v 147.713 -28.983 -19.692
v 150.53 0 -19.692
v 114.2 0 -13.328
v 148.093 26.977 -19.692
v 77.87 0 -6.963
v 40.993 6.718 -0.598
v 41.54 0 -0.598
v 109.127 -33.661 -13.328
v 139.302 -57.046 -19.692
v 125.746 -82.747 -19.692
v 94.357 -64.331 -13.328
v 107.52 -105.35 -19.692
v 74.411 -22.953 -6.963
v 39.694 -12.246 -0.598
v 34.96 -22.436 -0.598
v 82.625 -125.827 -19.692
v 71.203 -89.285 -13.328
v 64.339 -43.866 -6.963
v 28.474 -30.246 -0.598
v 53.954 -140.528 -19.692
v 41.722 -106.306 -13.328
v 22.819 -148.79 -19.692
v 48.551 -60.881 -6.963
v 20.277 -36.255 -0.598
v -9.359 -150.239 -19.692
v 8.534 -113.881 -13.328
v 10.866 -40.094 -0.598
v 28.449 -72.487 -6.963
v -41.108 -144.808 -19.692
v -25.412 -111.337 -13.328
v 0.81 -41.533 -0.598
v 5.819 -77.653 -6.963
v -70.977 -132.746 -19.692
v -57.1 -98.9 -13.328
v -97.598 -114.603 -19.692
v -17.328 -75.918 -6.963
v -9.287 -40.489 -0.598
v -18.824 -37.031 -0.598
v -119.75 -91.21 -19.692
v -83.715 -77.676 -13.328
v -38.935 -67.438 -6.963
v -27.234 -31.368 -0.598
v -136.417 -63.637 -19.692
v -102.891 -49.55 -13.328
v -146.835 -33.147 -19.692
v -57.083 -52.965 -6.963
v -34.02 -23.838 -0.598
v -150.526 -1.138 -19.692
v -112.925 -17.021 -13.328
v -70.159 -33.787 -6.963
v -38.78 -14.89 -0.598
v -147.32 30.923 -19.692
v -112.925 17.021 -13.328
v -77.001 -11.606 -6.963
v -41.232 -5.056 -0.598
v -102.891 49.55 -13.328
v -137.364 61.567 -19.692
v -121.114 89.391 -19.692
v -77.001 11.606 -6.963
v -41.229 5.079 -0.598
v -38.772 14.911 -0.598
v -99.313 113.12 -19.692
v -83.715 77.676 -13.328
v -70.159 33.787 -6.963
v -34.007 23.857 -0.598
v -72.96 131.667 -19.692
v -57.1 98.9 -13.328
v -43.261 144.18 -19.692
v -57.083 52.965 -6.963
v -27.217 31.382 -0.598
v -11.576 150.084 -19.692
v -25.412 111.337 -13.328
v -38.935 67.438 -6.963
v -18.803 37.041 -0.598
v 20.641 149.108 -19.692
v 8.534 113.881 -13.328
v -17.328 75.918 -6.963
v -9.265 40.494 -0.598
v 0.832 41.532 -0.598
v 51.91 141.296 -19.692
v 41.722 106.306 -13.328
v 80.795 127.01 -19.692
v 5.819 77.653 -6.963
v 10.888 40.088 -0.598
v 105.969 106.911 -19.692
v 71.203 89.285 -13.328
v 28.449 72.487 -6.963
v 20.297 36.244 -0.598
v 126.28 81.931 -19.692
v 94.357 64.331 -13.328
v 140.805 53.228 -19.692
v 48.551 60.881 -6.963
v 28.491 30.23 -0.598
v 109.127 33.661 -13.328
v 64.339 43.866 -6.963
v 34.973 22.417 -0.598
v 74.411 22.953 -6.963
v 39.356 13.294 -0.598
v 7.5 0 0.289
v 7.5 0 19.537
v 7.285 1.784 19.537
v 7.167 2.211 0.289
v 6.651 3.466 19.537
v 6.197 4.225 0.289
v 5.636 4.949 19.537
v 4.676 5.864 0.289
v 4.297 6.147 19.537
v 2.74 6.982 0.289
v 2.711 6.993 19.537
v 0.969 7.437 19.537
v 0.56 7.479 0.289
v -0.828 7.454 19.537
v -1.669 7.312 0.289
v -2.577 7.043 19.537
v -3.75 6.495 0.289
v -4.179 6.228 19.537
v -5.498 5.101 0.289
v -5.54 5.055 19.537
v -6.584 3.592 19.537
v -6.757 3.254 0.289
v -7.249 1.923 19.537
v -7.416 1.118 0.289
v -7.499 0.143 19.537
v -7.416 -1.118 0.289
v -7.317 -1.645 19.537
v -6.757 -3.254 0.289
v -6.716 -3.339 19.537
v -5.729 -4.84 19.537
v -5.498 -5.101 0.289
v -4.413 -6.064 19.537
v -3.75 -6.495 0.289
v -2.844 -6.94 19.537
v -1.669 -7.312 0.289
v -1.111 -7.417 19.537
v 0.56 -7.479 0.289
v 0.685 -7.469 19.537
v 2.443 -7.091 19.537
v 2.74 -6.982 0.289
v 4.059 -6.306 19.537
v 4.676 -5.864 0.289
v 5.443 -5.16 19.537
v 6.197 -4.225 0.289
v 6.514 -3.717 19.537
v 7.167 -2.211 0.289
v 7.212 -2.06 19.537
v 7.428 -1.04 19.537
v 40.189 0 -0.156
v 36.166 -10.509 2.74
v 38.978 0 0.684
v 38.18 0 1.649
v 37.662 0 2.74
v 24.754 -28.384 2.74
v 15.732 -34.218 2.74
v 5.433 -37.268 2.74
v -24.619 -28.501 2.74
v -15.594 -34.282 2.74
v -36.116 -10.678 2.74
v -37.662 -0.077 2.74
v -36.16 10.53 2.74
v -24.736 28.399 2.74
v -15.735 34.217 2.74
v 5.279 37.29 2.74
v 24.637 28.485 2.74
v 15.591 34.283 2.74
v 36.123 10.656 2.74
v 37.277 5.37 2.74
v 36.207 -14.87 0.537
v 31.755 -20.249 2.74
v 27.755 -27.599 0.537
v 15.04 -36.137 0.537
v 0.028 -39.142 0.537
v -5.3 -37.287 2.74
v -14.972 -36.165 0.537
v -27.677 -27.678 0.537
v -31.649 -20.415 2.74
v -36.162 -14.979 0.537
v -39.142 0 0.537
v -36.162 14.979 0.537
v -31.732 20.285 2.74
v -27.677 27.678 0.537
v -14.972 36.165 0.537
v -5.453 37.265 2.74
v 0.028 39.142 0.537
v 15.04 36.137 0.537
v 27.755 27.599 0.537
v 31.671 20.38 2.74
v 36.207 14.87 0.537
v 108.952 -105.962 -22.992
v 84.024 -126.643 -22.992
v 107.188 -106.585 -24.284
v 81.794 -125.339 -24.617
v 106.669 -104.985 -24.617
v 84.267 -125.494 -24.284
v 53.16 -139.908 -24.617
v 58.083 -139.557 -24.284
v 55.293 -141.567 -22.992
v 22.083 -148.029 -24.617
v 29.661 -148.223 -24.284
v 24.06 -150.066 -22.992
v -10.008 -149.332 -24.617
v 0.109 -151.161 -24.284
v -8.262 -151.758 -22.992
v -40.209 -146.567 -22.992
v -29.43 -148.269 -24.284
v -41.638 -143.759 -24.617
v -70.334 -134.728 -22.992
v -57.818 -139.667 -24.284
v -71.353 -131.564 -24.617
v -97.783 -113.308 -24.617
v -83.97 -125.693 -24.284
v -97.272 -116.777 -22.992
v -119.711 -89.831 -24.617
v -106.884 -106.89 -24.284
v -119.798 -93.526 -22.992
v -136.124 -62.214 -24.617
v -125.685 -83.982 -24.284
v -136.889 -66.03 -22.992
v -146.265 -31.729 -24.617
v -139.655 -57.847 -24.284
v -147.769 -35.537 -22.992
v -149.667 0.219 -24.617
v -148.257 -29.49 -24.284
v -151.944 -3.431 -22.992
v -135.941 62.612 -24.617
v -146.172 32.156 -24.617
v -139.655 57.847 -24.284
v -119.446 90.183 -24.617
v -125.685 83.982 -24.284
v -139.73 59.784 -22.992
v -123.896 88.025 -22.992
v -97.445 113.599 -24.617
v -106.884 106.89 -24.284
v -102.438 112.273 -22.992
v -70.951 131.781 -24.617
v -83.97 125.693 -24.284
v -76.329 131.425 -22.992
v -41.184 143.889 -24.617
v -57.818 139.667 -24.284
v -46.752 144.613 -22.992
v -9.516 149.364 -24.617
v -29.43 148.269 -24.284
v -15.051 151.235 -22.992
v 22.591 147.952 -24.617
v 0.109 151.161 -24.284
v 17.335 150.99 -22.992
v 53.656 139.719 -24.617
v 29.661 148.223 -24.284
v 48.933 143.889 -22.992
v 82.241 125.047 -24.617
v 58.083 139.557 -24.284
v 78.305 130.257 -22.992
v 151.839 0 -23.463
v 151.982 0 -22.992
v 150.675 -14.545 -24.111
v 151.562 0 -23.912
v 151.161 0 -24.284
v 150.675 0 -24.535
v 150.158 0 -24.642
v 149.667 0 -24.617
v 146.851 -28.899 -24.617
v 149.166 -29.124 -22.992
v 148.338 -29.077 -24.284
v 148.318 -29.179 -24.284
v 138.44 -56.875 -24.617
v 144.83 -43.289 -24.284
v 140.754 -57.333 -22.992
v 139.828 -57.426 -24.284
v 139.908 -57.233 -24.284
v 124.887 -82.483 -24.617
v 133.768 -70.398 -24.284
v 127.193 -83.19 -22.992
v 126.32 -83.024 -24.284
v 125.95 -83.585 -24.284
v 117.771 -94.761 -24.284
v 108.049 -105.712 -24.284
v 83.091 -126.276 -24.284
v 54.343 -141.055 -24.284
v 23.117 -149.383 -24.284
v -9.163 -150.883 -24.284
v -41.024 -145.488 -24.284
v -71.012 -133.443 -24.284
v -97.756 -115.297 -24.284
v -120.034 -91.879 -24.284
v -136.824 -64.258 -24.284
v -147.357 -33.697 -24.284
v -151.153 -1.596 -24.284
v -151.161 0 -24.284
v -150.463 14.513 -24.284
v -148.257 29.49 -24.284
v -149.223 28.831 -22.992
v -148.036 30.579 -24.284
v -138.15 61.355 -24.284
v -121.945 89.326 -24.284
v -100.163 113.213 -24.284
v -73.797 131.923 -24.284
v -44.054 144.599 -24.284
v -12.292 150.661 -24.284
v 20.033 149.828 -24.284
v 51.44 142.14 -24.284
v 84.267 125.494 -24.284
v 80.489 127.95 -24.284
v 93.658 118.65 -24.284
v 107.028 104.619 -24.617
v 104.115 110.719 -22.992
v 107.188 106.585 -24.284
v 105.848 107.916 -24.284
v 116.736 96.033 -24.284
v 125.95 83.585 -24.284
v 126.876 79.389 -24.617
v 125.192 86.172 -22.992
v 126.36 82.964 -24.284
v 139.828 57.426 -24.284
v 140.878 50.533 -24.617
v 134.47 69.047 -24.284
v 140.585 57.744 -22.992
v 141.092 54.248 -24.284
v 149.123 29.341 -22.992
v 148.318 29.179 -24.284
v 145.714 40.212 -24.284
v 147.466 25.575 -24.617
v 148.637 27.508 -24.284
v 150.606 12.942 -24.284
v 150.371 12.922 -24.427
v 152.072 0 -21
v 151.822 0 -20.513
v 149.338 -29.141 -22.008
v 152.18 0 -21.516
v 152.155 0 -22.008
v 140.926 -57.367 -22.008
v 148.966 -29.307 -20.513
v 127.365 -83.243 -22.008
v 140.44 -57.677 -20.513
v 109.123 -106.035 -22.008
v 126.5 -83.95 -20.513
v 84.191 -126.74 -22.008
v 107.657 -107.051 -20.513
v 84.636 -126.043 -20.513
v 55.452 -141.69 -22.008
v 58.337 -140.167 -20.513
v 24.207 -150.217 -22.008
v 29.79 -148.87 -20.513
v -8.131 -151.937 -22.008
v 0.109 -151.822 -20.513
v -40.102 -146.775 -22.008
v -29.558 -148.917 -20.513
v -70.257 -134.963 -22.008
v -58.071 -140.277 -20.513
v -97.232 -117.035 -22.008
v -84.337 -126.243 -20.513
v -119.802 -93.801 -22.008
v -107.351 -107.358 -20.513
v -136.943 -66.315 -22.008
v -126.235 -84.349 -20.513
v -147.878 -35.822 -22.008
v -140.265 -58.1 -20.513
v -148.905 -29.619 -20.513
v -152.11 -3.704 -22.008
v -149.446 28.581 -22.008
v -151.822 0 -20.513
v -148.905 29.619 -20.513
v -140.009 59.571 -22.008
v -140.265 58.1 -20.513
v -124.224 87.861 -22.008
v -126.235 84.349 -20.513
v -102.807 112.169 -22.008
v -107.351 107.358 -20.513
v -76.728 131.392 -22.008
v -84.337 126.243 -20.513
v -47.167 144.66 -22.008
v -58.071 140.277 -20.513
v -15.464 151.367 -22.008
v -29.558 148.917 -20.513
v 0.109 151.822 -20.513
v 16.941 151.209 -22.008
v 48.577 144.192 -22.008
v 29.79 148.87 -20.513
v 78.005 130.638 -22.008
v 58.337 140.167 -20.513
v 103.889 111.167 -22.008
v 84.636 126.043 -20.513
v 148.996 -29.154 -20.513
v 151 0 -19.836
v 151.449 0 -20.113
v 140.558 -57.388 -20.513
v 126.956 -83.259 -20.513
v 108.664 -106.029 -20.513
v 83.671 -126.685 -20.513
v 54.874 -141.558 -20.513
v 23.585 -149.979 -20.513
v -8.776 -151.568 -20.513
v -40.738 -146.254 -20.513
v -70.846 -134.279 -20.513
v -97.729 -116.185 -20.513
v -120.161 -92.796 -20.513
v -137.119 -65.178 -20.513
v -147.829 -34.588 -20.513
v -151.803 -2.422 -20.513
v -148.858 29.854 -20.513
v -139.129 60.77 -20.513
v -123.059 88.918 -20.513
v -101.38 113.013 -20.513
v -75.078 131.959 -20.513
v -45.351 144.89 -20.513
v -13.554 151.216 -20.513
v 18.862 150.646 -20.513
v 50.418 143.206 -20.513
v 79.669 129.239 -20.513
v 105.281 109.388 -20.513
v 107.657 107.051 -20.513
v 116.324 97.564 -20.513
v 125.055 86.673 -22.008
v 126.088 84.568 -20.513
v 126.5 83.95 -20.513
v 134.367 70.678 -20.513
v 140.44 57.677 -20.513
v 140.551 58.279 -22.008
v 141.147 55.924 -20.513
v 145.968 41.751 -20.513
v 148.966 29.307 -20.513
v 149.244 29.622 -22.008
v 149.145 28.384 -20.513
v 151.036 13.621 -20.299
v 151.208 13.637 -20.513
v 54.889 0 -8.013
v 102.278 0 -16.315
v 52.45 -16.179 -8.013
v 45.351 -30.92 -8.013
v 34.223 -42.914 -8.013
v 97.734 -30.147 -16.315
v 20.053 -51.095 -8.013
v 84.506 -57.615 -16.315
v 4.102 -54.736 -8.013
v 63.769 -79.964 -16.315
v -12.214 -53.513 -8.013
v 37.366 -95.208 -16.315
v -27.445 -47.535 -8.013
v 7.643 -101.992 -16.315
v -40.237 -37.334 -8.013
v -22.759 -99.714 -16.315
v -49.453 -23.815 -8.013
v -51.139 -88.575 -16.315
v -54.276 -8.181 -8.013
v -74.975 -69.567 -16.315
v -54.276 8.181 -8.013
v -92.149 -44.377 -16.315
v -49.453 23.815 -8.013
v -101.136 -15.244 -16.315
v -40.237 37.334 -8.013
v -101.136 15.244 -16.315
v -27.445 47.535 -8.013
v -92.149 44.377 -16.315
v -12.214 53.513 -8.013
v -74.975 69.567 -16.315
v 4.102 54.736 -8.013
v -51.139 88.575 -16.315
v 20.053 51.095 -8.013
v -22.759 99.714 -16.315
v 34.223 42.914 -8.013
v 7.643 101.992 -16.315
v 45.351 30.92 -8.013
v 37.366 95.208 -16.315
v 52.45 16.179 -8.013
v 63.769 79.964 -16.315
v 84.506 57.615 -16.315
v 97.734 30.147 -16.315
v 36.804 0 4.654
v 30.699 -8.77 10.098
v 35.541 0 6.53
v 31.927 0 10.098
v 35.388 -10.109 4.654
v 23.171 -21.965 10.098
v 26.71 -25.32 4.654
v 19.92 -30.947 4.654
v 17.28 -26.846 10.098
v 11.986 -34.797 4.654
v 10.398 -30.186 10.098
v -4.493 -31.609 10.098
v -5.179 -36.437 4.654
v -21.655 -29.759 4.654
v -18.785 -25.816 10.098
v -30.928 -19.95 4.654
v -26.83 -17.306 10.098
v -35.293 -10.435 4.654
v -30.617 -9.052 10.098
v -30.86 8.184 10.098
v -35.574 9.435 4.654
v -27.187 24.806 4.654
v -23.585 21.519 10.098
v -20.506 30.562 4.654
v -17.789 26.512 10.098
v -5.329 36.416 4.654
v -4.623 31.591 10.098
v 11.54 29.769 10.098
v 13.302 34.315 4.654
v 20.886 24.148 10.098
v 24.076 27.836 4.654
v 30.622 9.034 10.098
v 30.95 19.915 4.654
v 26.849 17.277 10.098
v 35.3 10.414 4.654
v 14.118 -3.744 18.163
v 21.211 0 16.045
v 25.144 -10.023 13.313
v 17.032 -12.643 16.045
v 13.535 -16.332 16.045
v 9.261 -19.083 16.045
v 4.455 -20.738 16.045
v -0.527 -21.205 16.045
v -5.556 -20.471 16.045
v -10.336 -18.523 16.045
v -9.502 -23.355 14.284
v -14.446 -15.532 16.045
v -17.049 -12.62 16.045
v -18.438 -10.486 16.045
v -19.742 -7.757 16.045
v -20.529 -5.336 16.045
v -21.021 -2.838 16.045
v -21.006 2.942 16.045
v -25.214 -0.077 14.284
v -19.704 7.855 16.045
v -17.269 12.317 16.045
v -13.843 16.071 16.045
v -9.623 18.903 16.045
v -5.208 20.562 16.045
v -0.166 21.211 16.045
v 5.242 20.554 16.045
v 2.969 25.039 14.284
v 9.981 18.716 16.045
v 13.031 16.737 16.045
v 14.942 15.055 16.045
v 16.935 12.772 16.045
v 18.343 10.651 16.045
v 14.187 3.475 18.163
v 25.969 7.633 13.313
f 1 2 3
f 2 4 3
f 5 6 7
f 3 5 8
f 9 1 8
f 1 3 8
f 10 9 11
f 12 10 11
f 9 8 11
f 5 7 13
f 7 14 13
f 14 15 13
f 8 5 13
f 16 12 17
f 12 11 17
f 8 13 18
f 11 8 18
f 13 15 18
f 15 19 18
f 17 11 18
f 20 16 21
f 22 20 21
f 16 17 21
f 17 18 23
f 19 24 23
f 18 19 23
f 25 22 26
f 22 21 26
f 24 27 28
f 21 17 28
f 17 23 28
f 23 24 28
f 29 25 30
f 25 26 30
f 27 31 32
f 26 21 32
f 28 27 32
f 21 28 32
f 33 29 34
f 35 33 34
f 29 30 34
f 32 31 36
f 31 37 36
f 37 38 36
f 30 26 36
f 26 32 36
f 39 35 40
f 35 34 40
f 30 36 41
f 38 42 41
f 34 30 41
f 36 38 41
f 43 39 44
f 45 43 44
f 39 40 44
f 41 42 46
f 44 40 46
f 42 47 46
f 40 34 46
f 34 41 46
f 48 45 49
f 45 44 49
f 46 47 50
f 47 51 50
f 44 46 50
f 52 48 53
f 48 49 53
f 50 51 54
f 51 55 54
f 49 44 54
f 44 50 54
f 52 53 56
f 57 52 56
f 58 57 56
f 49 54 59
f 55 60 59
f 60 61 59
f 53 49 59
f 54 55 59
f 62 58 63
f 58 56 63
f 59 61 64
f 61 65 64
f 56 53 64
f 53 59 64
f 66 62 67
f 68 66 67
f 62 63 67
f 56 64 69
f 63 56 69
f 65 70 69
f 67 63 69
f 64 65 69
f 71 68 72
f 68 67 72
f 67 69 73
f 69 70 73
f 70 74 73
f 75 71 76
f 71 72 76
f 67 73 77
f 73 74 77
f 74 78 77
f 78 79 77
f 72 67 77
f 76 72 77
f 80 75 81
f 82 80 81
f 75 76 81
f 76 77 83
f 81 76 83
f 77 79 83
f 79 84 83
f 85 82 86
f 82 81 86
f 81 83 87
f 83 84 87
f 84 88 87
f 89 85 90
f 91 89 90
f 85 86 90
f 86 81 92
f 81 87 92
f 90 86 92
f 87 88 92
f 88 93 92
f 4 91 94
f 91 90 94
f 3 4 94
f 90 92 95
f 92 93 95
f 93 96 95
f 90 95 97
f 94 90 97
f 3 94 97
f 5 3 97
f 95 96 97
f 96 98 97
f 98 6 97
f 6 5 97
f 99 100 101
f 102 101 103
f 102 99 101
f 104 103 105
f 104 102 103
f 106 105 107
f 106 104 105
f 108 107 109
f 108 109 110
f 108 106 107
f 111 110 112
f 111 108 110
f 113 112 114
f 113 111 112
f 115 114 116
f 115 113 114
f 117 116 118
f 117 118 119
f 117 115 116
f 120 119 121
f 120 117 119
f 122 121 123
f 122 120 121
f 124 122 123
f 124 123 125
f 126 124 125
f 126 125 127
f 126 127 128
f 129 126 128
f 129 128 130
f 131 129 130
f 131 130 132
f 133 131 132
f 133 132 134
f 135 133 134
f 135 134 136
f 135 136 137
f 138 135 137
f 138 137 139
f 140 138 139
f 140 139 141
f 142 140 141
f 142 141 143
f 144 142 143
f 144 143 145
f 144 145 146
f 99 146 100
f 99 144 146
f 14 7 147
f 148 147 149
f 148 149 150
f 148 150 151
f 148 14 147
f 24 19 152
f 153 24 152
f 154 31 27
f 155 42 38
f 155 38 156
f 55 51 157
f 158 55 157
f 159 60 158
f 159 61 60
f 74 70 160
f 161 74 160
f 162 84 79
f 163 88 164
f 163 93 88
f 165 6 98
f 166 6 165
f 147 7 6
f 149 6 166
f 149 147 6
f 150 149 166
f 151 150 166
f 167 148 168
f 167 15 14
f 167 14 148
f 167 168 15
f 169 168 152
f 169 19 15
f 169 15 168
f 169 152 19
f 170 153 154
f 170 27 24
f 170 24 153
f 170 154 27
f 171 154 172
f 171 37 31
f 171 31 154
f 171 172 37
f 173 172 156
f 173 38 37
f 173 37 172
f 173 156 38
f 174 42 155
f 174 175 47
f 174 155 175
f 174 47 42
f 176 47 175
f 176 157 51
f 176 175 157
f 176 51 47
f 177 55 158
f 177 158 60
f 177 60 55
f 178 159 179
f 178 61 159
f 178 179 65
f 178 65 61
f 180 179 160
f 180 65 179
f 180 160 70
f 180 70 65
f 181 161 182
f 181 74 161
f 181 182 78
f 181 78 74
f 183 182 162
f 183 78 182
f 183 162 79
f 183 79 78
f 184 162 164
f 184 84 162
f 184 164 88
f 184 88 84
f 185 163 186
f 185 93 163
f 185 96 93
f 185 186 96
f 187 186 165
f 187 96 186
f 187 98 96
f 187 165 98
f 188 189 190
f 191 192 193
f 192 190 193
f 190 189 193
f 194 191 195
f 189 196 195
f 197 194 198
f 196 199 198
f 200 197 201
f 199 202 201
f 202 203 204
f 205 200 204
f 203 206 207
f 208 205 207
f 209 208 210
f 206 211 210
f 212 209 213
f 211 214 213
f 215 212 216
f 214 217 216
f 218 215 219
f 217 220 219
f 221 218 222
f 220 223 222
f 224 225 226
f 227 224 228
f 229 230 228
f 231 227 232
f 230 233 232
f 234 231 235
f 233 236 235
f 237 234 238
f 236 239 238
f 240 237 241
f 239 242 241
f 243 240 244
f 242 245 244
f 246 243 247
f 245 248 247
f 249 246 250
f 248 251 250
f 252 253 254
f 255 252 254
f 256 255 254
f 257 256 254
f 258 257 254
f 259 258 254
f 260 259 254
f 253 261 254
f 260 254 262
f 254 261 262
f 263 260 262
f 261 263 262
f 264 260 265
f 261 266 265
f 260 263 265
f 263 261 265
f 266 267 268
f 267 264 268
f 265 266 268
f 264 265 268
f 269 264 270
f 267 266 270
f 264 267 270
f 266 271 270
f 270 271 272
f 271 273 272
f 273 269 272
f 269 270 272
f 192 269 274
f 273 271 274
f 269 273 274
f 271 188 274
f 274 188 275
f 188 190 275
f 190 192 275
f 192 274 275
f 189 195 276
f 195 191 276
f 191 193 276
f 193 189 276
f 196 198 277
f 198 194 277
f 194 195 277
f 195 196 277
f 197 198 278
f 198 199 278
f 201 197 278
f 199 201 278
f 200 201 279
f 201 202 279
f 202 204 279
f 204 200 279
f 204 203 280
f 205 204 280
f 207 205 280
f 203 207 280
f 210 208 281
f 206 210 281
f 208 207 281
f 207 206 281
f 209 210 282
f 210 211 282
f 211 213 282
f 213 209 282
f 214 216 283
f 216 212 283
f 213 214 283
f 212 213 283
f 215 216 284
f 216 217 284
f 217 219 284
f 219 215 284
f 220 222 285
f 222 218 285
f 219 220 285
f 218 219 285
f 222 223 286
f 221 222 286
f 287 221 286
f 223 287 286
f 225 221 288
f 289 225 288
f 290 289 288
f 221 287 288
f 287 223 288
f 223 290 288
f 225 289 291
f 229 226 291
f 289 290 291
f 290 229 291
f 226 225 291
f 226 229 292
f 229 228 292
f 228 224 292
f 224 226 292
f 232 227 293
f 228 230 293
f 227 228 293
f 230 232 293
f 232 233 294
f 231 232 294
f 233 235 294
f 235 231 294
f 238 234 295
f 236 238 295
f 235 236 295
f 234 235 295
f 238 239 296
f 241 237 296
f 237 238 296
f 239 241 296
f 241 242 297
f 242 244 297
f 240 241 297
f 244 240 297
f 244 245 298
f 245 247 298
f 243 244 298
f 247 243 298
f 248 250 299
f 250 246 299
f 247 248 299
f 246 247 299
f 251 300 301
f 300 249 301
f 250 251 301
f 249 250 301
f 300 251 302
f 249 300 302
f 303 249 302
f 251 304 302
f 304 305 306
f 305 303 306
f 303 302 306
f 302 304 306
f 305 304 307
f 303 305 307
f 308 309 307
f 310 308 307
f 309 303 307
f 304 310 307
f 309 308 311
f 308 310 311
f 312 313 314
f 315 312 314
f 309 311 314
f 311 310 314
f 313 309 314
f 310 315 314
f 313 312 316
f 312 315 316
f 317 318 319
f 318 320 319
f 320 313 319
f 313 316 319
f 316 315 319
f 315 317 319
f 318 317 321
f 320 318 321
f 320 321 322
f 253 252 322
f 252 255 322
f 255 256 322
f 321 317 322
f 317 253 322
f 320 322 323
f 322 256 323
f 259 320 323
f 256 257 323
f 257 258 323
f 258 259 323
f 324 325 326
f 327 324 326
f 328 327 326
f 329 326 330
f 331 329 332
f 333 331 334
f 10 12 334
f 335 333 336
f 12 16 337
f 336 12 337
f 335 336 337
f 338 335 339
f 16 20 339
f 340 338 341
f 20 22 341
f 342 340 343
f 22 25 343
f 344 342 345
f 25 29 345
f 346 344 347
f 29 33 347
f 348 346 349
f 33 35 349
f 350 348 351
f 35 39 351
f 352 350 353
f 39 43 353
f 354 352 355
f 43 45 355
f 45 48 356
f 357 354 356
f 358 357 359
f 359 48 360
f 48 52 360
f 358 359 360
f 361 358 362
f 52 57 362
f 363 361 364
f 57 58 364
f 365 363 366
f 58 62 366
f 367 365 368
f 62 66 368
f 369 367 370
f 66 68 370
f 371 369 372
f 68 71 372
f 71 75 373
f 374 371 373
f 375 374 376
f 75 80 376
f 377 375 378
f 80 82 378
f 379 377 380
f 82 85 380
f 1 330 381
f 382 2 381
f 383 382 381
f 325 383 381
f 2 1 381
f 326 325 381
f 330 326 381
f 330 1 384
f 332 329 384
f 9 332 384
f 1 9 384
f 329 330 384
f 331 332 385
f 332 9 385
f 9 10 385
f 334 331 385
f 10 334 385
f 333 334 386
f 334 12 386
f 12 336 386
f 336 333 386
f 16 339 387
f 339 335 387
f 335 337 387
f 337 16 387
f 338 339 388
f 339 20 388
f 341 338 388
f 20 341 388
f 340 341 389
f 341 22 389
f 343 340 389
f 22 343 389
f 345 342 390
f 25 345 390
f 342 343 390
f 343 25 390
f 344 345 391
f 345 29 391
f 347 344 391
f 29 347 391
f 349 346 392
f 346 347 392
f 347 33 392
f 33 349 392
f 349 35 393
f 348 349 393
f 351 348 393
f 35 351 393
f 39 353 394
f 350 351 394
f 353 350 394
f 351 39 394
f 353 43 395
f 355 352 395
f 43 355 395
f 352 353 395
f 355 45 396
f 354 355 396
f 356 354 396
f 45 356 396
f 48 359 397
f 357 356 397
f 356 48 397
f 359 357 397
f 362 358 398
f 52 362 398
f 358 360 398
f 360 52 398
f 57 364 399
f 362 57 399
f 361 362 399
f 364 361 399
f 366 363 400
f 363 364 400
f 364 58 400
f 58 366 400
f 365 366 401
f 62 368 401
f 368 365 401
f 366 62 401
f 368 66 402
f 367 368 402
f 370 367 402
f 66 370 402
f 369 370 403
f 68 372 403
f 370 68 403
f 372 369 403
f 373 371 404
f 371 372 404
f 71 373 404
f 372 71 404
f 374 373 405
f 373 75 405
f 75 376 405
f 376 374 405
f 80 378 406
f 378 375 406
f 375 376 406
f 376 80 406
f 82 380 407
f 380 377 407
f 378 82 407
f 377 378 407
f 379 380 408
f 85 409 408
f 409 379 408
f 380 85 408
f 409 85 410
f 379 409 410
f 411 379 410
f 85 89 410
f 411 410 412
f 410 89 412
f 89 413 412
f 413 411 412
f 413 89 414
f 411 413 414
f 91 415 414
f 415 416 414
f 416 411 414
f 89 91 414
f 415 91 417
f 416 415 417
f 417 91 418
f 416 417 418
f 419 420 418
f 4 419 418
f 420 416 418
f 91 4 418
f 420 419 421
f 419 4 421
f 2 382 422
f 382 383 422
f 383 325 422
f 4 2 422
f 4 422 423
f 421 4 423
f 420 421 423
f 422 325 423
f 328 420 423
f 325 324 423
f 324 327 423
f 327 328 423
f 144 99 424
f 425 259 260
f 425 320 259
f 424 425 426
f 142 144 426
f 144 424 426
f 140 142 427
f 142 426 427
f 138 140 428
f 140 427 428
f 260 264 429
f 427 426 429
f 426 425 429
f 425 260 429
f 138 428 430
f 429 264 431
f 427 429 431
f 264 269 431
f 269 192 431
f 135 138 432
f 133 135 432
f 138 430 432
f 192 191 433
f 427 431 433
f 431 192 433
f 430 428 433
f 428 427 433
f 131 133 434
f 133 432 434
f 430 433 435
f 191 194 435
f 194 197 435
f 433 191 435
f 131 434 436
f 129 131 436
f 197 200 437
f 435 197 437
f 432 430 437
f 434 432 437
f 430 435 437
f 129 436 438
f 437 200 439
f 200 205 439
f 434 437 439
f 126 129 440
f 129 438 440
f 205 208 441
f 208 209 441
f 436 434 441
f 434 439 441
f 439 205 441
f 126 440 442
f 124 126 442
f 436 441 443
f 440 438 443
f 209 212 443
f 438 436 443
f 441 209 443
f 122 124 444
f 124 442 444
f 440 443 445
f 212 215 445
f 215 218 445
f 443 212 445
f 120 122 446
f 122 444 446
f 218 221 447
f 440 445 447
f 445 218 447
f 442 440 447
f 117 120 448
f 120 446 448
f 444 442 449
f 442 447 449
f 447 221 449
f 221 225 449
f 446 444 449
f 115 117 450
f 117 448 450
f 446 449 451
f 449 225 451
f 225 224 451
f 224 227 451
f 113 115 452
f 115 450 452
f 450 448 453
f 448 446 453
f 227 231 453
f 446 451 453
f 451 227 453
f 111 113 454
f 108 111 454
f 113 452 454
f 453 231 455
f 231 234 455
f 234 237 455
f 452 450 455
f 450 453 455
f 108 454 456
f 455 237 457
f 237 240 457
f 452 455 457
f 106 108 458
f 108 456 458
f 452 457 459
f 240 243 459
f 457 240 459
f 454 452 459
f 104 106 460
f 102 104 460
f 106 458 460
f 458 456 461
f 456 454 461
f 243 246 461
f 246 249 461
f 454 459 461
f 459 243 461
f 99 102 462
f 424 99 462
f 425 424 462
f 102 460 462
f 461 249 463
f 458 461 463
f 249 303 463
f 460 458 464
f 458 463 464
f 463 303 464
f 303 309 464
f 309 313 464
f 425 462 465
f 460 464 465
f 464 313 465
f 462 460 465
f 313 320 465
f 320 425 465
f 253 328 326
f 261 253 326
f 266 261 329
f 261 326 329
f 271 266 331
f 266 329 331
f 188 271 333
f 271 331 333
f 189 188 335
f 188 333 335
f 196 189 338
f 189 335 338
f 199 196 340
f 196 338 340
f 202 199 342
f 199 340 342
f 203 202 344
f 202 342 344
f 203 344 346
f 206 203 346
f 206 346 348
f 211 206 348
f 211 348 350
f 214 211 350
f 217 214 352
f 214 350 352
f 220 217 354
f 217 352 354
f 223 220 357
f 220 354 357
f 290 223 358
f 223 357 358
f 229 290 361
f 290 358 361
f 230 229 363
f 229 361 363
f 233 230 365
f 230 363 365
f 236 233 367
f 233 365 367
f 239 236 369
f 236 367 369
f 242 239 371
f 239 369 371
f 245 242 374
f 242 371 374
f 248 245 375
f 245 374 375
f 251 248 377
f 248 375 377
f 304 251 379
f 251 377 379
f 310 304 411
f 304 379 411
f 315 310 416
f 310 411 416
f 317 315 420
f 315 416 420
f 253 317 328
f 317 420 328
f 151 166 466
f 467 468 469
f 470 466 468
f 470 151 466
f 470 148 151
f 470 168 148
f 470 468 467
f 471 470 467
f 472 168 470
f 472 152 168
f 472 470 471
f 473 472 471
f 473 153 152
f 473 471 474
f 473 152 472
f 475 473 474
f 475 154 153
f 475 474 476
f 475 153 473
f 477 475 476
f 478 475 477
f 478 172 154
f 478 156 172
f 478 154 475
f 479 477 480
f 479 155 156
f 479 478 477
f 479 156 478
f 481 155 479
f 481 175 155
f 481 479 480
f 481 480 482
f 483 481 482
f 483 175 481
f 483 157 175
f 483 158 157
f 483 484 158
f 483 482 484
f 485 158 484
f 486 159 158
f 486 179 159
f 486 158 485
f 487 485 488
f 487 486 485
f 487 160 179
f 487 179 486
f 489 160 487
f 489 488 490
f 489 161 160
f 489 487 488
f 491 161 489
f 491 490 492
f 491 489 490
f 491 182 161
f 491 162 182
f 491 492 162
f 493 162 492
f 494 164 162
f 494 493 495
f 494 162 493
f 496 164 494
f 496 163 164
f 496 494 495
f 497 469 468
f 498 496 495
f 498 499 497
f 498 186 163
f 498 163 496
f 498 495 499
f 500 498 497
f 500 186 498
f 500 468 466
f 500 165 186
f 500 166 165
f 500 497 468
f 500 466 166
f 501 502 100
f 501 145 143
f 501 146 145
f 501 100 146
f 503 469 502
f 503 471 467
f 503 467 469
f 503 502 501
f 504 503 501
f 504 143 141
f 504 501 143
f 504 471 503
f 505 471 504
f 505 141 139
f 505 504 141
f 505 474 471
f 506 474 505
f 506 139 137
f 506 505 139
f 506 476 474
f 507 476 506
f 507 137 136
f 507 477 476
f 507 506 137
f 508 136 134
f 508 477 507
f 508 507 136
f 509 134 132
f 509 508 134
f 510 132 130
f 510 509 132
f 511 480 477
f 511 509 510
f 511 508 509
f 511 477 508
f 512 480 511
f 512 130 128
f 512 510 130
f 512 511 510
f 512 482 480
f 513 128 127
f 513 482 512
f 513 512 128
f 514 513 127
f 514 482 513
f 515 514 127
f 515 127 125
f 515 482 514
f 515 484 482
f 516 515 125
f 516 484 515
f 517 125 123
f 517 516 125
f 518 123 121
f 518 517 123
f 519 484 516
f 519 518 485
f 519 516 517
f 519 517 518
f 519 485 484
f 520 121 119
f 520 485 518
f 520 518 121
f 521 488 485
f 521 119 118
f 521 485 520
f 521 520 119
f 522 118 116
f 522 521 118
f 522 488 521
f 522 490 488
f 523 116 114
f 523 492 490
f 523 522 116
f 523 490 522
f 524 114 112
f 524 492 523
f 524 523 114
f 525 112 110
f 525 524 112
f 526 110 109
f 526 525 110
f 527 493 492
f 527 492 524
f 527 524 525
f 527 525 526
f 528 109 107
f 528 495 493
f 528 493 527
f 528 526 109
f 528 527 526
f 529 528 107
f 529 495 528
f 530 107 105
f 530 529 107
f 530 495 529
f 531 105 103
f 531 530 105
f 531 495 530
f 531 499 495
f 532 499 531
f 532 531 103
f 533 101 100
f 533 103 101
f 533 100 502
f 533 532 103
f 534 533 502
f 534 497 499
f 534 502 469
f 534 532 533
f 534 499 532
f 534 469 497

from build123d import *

# Parameters (mm, degrees)
F2_R          = 7.5
F3_DEPTH      = 20.038504
F3_DEPTH_BACK = 24.963496
F4_R          = 2
F5_R          = 5


with BuildPart() as f1:
    # F0 (on Front) → F1 (revolve)
    with BuildSketch(Plane.XZ):
        with BuildLine():
            Line((152.5, -20.037504), (38.125, 0))
            add(Edge.make_bspline(
                [(0, 20.037504), (19.0625, 20.037504), (38.125, 10.018752), (38.125, 0)],
                knots=[0, 0, 0, 0, 43.06991, 43.06991, 43.06991, 43.06991], degree=3))
            Line((0, 20.037504), (0, 1.603018))
            Line((0, 1.603018), (151.637184, -24.962496))
            Line((151.637184, -24.962496), (152.5, -20.037504))
        make_face()
    revolve(axis=Axis((0, 0, -2.462496), (0, 0, -1)))

    # F2 (on Top) → F3 (cut, two sides)
    with BuildSketch(Plane.XY) as f3_sk:
        Circle(F2_R)
    extrude(amount=F3_DEPTH, mode=Mode.SUBTRACT)
    extrude(f3_sk.sketch, amount=-F3_DEPTH_BACK, mode=Mode.SUBTRACT)

    # F4
    f4_edges = [f1.edges().sort_by_distance(p)[0] for p in [
        (-151.637184, 0, -24.962496),
        (-152.5, 0, -20.037504),
    ]]
    fillet(f4_edges, radius=F4_R)

    # F5
    f5_edges = [f1.edges().sort_by_distance(p)[0] for p in [
        (-38.125, 0, 0),
    ]]
    fillet(f5_edges, radius=F5_R)


solid = f1.part
